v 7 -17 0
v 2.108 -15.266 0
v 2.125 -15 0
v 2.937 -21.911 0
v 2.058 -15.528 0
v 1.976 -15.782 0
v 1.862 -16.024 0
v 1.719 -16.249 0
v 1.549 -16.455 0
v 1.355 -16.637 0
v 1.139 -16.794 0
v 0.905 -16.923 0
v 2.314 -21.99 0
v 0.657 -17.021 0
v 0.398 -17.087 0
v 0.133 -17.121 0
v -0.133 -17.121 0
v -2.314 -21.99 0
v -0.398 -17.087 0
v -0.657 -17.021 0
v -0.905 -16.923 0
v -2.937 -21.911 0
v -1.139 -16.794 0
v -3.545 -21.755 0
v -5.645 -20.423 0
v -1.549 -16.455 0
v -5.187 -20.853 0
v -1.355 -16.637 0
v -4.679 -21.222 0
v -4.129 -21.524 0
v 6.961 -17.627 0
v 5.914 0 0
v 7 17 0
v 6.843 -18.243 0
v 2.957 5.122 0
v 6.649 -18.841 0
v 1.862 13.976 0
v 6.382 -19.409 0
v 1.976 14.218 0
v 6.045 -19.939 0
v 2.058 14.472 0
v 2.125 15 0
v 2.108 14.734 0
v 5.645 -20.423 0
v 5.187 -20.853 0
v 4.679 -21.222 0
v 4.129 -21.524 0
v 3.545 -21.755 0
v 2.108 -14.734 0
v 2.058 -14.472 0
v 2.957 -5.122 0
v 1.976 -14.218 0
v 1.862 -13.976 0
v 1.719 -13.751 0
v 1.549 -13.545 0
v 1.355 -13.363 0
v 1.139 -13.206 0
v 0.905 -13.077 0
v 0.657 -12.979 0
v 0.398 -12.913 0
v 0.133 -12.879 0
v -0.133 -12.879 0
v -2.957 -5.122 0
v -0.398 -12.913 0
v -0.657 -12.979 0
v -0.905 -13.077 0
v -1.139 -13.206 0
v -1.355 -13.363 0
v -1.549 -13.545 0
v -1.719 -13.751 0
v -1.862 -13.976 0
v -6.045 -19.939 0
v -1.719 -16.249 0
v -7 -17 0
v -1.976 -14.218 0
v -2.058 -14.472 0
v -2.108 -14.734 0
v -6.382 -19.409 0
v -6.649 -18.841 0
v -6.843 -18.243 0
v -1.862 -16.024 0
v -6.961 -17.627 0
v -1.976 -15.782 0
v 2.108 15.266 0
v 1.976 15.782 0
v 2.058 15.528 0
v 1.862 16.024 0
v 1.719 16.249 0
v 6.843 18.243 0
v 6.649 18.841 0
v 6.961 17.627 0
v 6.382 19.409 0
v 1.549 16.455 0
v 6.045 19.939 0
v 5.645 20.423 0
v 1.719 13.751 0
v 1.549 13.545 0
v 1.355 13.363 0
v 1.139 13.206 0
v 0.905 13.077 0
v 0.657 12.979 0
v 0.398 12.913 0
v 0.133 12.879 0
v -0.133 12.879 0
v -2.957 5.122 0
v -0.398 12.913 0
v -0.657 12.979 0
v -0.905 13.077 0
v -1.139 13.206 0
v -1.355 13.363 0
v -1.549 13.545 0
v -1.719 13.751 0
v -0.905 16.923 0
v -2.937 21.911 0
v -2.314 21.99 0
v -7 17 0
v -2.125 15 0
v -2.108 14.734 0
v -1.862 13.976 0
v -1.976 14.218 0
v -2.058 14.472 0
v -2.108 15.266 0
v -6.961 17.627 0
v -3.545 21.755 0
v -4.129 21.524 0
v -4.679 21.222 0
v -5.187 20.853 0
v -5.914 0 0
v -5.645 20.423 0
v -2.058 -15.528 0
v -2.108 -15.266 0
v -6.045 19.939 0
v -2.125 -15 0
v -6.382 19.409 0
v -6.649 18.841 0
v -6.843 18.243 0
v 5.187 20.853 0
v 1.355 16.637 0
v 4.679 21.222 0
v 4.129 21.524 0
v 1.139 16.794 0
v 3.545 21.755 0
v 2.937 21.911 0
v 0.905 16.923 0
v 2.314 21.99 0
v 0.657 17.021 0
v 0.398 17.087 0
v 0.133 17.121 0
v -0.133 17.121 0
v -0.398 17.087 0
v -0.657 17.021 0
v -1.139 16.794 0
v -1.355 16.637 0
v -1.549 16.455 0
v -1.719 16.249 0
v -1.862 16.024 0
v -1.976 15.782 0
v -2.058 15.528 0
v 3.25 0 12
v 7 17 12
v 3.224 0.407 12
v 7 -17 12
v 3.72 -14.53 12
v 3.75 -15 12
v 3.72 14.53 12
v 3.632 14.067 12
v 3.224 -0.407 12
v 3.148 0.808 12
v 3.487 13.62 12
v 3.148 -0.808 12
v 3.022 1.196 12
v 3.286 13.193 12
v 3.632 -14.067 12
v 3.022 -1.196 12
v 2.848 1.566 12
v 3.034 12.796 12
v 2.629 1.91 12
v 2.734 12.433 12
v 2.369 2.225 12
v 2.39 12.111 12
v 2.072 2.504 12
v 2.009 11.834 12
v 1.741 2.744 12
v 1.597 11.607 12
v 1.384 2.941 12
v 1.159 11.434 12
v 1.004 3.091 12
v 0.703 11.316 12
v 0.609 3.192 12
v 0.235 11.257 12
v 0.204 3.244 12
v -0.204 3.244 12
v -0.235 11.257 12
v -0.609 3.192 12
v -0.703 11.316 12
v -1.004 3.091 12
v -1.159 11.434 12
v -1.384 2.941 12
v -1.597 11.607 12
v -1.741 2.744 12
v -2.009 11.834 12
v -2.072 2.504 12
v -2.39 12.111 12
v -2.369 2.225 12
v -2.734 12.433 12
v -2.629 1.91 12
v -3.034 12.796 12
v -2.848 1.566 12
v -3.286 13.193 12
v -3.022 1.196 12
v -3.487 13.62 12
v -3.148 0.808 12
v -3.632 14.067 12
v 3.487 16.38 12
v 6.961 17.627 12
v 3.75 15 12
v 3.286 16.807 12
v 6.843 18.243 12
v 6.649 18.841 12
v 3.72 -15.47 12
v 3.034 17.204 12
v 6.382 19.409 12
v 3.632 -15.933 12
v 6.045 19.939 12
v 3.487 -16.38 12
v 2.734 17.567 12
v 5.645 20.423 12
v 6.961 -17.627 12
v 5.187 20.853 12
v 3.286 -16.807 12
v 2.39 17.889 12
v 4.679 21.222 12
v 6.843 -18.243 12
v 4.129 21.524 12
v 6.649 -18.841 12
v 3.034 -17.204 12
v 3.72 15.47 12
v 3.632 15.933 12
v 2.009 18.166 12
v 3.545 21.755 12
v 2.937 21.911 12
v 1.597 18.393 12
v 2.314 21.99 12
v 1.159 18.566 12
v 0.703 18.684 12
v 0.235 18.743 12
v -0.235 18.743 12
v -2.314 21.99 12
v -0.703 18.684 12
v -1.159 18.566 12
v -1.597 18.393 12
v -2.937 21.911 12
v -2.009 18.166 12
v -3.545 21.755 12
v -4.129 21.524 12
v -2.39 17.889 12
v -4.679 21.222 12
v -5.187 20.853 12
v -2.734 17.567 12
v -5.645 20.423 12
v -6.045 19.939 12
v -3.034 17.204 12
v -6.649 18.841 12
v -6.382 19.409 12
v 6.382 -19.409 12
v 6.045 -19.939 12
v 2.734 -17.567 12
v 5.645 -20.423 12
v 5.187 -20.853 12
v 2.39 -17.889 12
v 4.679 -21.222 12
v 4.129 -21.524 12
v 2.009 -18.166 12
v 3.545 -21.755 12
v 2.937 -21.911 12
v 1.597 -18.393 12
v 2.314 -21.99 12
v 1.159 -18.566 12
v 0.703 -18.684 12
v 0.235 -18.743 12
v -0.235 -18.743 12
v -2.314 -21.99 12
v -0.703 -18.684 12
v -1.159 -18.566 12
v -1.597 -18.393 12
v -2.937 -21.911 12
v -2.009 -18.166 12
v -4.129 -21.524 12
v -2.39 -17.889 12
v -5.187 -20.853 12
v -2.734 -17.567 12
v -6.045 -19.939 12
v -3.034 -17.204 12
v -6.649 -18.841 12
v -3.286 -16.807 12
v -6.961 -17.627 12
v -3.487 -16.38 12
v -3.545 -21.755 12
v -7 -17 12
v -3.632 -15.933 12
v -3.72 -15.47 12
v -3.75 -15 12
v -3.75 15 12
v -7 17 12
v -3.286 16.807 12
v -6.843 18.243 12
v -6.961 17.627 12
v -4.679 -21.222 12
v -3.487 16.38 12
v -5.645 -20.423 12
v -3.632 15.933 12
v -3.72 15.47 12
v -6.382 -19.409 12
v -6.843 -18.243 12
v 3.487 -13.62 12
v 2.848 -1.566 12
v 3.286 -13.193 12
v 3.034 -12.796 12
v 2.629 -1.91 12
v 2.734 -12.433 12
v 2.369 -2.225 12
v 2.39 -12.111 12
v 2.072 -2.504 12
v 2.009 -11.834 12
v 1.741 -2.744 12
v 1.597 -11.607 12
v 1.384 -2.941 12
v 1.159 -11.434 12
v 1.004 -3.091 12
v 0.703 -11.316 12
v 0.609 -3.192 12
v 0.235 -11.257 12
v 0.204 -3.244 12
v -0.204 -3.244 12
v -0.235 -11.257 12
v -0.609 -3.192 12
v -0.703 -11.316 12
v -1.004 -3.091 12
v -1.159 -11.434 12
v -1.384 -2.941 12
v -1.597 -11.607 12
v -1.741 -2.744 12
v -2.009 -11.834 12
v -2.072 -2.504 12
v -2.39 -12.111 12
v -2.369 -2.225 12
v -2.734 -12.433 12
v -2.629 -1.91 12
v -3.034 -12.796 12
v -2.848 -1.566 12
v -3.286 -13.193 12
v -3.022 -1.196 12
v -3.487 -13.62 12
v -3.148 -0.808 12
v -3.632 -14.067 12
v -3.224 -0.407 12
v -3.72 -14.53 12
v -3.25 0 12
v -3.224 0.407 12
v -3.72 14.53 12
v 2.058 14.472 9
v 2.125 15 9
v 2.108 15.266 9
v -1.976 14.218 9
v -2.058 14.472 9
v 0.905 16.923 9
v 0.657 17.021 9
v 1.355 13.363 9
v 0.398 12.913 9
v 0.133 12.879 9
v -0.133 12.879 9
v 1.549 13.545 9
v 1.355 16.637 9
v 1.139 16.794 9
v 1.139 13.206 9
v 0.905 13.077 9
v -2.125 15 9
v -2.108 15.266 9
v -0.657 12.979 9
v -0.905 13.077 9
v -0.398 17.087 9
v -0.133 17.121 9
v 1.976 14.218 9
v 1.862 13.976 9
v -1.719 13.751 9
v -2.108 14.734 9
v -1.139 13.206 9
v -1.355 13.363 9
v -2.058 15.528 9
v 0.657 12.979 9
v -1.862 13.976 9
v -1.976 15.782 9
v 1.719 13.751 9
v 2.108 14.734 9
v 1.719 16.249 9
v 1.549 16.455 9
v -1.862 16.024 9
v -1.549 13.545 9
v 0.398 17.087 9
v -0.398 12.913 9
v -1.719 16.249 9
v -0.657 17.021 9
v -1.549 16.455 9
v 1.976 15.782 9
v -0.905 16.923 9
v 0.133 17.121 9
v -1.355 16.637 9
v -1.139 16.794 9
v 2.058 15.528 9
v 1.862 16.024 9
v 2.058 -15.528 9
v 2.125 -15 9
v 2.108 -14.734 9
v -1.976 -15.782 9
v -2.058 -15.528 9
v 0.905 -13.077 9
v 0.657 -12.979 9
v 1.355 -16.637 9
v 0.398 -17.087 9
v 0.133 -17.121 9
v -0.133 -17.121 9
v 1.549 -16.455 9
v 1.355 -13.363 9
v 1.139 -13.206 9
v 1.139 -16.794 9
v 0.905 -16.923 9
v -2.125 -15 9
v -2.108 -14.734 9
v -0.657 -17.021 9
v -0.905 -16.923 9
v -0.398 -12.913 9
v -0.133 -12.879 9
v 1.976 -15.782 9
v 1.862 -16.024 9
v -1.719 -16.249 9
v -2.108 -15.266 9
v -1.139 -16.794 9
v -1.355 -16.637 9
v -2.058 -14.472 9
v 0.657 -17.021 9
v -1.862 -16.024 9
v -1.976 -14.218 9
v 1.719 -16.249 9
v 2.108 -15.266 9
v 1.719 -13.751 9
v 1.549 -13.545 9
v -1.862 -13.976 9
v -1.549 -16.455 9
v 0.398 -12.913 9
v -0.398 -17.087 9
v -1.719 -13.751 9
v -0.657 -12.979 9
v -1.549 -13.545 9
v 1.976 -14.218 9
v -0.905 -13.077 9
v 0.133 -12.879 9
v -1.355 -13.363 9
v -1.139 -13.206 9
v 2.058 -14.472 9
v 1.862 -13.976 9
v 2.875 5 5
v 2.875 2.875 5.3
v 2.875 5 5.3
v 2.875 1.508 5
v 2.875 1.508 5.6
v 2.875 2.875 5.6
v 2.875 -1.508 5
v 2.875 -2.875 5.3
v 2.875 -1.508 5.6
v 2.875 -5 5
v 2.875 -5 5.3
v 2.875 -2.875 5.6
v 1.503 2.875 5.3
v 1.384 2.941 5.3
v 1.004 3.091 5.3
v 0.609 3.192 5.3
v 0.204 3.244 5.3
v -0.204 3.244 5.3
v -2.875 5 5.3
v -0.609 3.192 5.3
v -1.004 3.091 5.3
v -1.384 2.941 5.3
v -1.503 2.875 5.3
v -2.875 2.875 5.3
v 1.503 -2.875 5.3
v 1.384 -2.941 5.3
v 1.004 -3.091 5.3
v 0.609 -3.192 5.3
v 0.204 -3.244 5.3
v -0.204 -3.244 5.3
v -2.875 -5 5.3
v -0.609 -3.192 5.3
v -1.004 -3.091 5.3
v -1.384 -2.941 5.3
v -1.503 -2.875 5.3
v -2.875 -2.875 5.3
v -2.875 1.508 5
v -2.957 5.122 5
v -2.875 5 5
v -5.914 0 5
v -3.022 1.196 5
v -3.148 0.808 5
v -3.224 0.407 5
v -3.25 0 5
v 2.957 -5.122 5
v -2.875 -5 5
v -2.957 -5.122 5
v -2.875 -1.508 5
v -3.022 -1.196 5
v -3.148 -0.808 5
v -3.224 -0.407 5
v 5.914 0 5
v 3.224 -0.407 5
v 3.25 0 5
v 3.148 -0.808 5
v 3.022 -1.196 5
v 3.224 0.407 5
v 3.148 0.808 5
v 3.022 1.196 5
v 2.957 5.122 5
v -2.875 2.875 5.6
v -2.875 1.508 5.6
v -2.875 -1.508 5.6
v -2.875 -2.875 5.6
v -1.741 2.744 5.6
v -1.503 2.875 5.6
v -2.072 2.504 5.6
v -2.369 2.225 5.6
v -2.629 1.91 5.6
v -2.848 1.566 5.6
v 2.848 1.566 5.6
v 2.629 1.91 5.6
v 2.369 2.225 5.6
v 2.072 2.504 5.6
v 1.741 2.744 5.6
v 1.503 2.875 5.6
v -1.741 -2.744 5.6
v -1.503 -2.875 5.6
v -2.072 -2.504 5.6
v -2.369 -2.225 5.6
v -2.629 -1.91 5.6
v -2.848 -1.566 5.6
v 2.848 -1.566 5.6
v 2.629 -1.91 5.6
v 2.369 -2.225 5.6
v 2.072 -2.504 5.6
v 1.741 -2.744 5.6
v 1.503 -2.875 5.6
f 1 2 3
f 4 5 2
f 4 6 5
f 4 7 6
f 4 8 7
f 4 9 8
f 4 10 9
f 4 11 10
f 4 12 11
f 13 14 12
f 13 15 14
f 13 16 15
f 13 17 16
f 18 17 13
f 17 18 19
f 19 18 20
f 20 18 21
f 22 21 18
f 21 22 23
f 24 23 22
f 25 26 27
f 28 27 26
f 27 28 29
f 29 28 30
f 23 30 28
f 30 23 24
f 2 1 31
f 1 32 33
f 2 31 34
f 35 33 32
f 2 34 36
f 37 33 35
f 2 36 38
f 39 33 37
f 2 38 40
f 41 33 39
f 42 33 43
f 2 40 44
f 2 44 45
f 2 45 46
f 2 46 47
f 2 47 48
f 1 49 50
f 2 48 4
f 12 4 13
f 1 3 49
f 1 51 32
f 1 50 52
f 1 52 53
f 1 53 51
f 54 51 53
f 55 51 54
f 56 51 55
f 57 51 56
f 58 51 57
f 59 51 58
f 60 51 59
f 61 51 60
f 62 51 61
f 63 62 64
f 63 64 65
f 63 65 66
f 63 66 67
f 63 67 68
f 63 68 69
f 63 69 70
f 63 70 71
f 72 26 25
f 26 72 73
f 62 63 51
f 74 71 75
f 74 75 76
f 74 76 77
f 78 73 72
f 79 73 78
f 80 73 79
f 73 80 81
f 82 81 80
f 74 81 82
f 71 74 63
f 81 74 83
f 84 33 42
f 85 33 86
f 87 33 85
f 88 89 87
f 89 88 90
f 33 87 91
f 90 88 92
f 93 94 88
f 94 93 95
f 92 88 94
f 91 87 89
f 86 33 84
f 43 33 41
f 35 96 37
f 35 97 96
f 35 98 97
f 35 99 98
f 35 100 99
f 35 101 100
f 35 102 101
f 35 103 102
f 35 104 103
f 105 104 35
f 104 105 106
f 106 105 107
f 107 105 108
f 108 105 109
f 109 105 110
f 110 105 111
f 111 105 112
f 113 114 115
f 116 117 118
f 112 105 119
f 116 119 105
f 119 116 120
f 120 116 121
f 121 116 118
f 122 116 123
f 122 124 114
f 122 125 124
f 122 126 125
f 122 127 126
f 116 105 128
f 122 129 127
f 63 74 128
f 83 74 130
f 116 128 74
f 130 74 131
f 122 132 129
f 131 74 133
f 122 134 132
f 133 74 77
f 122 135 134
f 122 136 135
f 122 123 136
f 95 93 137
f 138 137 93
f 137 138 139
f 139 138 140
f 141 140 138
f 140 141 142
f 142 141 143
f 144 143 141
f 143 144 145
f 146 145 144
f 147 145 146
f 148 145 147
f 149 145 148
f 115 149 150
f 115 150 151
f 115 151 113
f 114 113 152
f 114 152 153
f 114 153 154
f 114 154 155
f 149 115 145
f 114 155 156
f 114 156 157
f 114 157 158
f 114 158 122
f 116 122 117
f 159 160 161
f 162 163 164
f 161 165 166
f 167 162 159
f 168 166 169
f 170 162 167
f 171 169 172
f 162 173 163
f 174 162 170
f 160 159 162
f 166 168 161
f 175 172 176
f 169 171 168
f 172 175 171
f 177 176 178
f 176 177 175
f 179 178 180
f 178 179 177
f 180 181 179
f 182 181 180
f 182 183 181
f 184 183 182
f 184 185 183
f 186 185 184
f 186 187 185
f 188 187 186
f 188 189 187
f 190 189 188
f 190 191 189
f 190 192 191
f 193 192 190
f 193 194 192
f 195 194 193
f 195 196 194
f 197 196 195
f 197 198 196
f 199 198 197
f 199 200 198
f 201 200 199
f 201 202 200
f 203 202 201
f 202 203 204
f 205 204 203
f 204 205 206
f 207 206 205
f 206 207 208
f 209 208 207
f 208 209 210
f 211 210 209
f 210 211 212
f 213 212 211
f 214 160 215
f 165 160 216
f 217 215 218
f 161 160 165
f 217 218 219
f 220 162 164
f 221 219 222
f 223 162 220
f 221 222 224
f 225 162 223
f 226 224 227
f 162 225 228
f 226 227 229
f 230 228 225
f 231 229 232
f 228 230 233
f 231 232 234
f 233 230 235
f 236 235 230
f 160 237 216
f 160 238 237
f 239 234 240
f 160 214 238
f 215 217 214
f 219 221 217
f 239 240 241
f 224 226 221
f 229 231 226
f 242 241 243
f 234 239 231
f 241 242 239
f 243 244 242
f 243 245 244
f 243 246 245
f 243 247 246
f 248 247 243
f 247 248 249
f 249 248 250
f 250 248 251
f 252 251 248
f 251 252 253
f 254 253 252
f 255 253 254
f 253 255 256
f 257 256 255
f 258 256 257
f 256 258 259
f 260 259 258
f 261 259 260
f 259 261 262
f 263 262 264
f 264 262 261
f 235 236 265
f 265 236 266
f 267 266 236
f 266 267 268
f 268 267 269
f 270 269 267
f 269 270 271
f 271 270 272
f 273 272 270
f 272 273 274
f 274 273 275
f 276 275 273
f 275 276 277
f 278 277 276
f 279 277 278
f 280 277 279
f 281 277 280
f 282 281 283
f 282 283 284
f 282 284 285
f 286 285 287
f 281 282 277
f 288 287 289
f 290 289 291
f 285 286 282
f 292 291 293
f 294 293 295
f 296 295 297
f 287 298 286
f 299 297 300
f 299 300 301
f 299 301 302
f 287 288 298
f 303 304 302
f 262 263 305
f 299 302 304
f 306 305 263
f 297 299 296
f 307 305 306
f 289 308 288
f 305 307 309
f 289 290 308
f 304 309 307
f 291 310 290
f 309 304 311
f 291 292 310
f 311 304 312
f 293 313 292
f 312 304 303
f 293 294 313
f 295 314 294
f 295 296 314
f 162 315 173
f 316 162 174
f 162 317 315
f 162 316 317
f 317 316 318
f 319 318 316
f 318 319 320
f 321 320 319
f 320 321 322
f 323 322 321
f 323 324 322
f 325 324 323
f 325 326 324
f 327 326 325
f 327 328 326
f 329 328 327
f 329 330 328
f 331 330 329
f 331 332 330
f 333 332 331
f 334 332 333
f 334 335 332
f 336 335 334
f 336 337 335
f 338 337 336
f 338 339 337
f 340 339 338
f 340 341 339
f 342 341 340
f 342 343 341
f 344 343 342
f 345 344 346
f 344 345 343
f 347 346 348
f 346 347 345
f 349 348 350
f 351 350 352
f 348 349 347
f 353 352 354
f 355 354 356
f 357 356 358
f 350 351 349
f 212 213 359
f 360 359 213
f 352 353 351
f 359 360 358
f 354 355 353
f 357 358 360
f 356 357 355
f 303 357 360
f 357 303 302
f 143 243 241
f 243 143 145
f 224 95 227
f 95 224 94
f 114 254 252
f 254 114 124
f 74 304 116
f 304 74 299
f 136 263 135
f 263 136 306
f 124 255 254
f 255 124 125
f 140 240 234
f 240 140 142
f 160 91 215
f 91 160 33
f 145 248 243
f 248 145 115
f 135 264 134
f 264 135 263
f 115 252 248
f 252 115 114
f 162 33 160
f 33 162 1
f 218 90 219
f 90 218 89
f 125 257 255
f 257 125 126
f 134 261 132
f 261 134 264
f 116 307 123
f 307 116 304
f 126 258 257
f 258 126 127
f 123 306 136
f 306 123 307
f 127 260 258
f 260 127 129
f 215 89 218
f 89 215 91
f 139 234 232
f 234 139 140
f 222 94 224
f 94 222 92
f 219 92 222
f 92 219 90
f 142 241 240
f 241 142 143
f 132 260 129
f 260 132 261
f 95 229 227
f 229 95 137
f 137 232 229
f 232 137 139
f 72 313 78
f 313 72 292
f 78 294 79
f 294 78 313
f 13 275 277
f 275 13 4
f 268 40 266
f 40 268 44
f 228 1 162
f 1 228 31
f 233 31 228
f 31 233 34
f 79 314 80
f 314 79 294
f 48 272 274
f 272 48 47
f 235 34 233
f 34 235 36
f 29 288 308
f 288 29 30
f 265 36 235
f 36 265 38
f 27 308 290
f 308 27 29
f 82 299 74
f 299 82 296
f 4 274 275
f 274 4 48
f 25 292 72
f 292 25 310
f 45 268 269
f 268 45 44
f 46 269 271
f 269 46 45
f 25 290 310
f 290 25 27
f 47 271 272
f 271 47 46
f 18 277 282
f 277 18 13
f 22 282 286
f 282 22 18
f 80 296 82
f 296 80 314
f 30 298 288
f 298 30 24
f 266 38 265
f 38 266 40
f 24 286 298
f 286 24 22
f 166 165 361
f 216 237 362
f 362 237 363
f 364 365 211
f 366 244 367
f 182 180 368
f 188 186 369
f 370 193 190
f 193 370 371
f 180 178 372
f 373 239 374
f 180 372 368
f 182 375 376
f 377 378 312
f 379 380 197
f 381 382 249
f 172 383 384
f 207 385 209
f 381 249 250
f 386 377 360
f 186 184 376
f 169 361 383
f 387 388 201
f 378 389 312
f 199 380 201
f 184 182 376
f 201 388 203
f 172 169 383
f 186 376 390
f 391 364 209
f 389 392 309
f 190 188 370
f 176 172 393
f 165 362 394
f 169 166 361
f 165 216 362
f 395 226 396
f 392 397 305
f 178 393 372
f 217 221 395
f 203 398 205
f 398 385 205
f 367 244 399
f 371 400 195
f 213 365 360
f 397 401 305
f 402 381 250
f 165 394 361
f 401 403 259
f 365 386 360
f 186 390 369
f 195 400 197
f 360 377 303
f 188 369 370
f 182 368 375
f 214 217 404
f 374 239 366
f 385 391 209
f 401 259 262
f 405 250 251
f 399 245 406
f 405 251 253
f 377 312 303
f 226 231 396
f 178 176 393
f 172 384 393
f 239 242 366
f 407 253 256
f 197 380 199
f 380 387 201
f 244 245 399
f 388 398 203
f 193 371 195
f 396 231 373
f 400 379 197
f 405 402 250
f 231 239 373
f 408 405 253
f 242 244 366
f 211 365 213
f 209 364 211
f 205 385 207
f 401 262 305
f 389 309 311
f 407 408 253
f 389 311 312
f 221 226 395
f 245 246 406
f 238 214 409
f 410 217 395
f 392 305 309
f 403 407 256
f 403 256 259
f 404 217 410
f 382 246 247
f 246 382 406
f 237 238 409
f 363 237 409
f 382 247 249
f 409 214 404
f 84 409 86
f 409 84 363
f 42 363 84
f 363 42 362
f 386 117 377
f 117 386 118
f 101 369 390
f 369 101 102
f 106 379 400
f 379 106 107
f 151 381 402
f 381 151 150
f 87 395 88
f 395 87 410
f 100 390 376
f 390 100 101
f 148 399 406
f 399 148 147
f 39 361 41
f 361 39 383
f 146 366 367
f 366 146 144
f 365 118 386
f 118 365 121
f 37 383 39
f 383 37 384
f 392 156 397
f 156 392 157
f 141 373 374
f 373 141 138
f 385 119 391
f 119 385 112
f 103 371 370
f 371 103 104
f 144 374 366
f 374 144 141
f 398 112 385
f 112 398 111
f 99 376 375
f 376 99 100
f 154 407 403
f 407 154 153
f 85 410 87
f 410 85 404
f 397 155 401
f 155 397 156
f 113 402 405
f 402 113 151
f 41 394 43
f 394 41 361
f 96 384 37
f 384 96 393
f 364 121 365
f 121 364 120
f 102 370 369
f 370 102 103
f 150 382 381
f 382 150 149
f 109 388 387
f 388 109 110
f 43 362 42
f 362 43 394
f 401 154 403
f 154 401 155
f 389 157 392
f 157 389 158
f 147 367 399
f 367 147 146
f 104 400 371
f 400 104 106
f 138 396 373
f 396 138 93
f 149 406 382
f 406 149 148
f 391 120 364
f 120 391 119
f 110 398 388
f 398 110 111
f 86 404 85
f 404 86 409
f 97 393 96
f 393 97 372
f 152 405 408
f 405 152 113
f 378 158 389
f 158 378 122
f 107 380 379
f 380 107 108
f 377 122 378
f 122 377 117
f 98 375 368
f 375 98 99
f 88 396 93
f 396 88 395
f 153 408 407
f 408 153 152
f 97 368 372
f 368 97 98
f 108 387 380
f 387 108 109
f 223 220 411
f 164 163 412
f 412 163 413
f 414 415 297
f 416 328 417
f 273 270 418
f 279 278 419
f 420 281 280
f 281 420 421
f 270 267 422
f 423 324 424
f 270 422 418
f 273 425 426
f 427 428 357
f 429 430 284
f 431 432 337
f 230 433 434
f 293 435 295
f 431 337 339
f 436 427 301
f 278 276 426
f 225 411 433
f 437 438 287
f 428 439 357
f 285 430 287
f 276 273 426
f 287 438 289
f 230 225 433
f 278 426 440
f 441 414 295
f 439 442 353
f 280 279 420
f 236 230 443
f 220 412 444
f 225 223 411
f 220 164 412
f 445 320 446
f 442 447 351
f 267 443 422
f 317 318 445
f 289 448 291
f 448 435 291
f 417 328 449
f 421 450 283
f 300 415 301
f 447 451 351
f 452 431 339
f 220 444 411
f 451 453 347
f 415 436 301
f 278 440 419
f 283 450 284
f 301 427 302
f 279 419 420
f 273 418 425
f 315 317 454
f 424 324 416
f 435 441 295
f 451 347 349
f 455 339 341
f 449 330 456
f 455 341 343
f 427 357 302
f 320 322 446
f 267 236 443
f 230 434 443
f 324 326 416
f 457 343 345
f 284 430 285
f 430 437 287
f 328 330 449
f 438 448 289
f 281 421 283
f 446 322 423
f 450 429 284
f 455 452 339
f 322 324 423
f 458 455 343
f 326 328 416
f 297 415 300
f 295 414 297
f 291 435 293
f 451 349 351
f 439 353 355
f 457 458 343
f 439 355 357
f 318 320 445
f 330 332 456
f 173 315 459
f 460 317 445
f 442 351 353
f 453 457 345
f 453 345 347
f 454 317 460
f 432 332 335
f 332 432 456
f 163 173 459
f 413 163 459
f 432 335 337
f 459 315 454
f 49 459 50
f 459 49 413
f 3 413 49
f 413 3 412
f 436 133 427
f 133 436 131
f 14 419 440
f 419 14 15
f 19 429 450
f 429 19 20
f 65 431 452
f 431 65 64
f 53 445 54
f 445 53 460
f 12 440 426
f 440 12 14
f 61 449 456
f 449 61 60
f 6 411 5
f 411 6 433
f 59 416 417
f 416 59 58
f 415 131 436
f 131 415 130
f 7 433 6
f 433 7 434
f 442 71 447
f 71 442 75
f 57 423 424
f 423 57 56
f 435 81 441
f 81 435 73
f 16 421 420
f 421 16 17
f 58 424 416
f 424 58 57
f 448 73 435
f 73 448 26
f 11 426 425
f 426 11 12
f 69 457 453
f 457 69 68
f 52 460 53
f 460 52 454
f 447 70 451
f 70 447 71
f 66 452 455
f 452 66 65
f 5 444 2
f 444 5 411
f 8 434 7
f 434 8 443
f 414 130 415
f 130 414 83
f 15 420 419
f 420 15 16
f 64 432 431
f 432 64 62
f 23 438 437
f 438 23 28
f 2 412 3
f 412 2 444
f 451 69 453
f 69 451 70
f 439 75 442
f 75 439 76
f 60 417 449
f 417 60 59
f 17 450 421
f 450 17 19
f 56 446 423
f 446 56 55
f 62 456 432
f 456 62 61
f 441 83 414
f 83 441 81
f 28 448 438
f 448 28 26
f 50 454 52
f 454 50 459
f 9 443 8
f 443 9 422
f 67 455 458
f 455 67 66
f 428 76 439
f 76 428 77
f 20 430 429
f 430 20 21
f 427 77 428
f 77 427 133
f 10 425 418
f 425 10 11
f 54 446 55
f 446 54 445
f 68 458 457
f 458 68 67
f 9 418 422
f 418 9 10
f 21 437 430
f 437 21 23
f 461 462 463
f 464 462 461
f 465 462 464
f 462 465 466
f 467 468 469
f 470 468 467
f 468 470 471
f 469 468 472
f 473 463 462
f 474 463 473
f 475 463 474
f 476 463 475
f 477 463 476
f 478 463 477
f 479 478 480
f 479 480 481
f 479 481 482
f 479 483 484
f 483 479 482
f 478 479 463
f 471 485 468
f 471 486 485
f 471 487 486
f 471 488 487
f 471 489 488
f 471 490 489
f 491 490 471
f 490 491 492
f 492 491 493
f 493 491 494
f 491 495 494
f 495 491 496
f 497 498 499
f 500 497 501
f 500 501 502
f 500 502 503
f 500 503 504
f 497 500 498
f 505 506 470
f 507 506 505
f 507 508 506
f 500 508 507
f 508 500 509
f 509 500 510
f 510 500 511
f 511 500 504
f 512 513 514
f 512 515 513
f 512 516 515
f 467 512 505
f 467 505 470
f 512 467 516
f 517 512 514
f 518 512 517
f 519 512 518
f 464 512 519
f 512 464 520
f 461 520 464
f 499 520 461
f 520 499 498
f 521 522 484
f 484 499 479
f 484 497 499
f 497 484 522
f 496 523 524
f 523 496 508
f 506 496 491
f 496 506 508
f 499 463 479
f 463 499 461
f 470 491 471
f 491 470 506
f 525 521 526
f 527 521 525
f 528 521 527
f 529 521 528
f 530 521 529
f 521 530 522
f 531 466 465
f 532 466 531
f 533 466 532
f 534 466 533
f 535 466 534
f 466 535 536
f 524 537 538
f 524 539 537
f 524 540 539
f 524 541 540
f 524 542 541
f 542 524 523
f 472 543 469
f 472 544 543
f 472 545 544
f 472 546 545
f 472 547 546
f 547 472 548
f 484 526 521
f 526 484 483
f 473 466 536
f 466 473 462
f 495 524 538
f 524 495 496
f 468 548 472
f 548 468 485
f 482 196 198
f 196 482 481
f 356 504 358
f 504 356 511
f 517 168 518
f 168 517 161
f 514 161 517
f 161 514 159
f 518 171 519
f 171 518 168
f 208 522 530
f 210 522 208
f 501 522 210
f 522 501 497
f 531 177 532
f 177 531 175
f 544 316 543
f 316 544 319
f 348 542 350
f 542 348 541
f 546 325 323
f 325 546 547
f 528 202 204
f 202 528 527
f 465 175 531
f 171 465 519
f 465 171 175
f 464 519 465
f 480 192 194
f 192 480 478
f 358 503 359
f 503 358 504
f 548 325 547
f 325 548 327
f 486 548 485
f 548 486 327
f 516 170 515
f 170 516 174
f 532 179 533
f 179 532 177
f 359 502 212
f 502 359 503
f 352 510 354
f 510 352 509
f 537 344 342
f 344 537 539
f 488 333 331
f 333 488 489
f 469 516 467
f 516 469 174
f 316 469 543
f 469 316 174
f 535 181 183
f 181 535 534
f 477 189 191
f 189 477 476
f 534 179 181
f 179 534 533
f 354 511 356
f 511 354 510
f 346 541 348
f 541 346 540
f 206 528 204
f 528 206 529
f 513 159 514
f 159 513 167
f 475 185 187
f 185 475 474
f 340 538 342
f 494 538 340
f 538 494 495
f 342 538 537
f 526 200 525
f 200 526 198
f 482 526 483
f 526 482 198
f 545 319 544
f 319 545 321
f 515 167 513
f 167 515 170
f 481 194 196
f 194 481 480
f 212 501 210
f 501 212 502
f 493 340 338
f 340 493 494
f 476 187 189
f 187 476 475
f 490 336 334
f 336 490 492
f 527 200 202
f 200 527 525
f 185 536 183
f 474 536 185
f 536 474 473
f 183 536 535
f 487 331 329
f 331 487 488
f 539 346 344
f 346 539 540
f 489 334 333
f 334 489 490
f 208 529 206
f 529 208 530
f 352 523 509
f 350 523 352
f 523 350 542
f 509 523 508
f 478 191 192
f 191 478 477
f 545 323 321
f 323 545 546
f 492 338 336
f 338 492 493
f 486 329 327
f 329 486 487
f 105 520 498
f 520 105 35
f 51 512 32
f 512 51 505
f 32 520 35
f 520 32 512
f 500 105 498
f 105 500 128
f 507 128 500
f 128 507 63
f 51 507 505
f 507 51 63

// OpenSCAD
$fn = 50;


difference() {
	union() {
		cylinder(h = 12, r = 7.0000000000);
		translate(v = [0.0000000000, 7.5000000000, 0]) {
			hull() {
				translate(v = [-2.0000000000, 9.5000000000, 0]) {
					cylinder(h = 12, r = 5);
				}
				translate(v = [2.0000000000, 9.5000000000, 0]) {
					cylinder(h = 12, r = 5);
				}
				translate(v = [-2.0000000000, -9.5000000000, 0]) {
					cylinder(h = 12, r = 5);
				}
				translate(v = [2.0000000000, -9.5000000000, 0]) {
					cylinder(h = 12, r = 5);
				}
			}
		}
		translate(v = [0.0000000000, 7.5000000000, 0]) {
			hull() {
				translate(v = [-2.0000000000, 9.5000000000, 0]) {
					cylinder(h = 12, r = 5);
				}
				translate(v = [2.0000000000, 9.5000000000, 0]) {
					cylinder(h = 12, r = 5);
				}
				translate(v = [-2.0000000000, -9.5000000000, 0]) {
					cylinder(h = 12, r = 5);
				}
				translate(v = [2.0000000000, -9.5000000000, 0]) {
					cylinder(h = 12, r = 5);
				}
			}
		}
		translate(v = [0.0000000000, -7.5000000000, 0]) {
			hull() {
				translate(v = [-2.0000000000, 9.5000000000, 0]) {
					cylinder(h = 12, r = 5);
				}
				translate(v = [2.0000000000, 9.5000000000, 0]) {
					cylinder(h = 12, r = 5);
				}
				translate(v = [-2.0000000000, -9.5000000000, 0]) {
					cylinder(h = 12, r = 5);
				}
				translate(v = [2.0000000000, -9.5000000000, 0]) {
					cylinder(h = 12, r = 5);
				}
			}
		}
		translate(v = [0.0000000000, -7.5000000000, 0]) {
			hull() {
				translate(v = [-2.0000000000, 9.5000000000, 0]) {
					cylinder(h = 12, r = 5);
				}
				translate(v = [2.0000000000, 9.5000000000, 0]) {
					cylinder(h = 12, r = 5);
				}
				translate(v = [-2.0000000000, -9.5000000000, 0]) {
					cylinder(h = 12, r = 5);
				}
				translate(v = [2.0000000000, -9.5000000000, 0]) {
					cylinder(h = 12, r = 5);
				}
			}
		}
	}
	union() {
		translate(v = [0.0000000000, 15.0000000000, 12]) {
			rotate(a = [0, 0, 0]) {
				difference() {
					union() {
						#translate(v = [0, 0, -12.0000000000]) {
							cylinder(h = 12, r = 2.0000000000);
						}
						#translate(v = [0, 0, -3]) {
							cylinder(h = 3, r1 = 2.1250000000, r2 = 3.7500000000);
						}
						#translate(v = [0, 0, -12.0000000000]) {
							cylinder(h = 12, r = 2.1250000000);
						}
						#translate(v = [0, 0, -12.0000000000]) {
							cylinder(h = 12, r = 2.0000000000);
						}
					}
					union();
				}
			}
		}
		translate(v = [0.0000000000, 15.0000000000, 12]) {
			rotate(a = [0, 0, 0]) {
				difference() {
					union() {
						#translate(v = [0, 0, -12.0000000000]) {
							cylinder(h = 12, r = 2.0000000000);
						}
						#translate(v = [0, 0, -3]) {
							cylinder(h = 3, r1 = 2.1250000000, r2 = 3.7500000000);
						}
						#translate(v = [0, 0, -12.0000000000]) {
							cylinder(h = 12, r = 2.1250000000);
						}
						#translate(v = [0, 0, -12.0000000000]) {
							cylinder(h = 12, r = 2.0000000000);
						}
					}
					union();
				}
			}
		}
		translate(v = [0.0000000000, -15.0000000000, 12]) {
			rotate(a = [0, 0, 0]) {
				difference() {
					union() {
						#translate(v = [0, 0, -12.0000000000]) {
							cylinder(h = 12, r = 2.0000000000);
						}
						#translate(v = [0, 0, -3]) {
							cylinder(h = 3, r1 = 2.1250000000, r2 = 3.7500000000);
						}
						#translate(v = [0, 0, -12.0000000000]) {
							cylinder(h = 12, r = 2.1250000000);
						}
						#translate(v = [0, 0, -12.0000000000]) {
							cylinder(h = 12, r = 2.0000000000);
						}
					}
					union();
				}
			}
		}
		translate(v = [0.0000000000, -15.0000000000, 12]) {
			rotate(a = [0, 0, 0]) {
				difference() {
					union() {
						#translate(v = [0, 0, -12.0000000000]) {
							cylinder(h = 12, r = 2.0000000000);
						}
						#translate(v = [0, 0, -3]) {
							cylinder(h = 3, r1 = 2.1250000000, r2 = 3.7500000000);
						}
						#translate(v = [0, 0, -12.0000000000]) {
							cylinder(h = 12, r = 2.1250000000);
						}
						#translate(v = [0, 0, -12.0000000000]) {
							cylinder(h = 12, r = 2.0000000000);
						}
					}
					union();
				}
			}
		}
		translate(v = [0.0000000000, 0.0000000000, 0]) {
			rotate(a = [0, 0, 0]) {
				difference() {
					union() {
						#translate(v = [-2.8750000000, -5.0000000000, -0.3000000000]) {
							cube(size = [5.7500000000, 10, 0.3000000000]);
						}
						#translate(v = [-2.8750000000, -2.8750000000, -0.6000000000]) {
							cube(size = [5.7500000000, 5.7500000000, 0.3000000000]);
						}
						#translate(v = [-2.8750000000, -5.0000000000, 5]) {
							cube(size = [5.7500000000, 10, 0.3000000000]);
						}
						#translate(v = [-2.8750000000, -2.8750000000, 5.3000000000]) {
							cube(size = [5.7500000000, 5.7500000000, 0.3000000000]);
						}
						#translate(v = [0, 0, -100.0000000000]) {
							cylinder(h = 200, r = 3.2500000000);
						}
						#linear_extrude(height = 5) {
							polygon(points = [[5.9142500000, 0.0000000000], [2.9571250000, 5.1218907443], [-2.9571250000, 5.1218907443], [-5.9142500000, 0.0000000000], [-2.9571250000, -5.1218907443], [2.9571250000, -5.1218907443]]);
						}
						#translate(v = [-2.8750000000, -5.0000000000, -0.3000000000]) {
							cube(size = [5.7500000000, 10, 0.3000000000]);
						}
						#translate(v = [-2.8750000000, -2.8750000000, -0.6000000000]) {
							cube(size = [5.7500000000, 5.7500000000, 0.3000000000]);
						}
						#translate(v = [-2.8750000000, -5.0000000000, 5]) {
							cube(size = [5.7500000000, 10, 0.3000000000]);
						}
						#translate(v = [-2.8750000000, -2.8750000000, 5.3000000000]) {
							cube(size = [5.7500000000, 5.7500000000, 0.3000000000]);
						}
						#translate(v = [0, 0, -100.0000000000]) {
							cylinder(h = 200, r = 3.2500000000);
						}
						#translate(v = [-2.8750000000, -5.0000000000, -0.3000000000]) {
							cube(size = [5.7500000000, 10, 0.3000000000]);
						}
						#translate(v = [-2.8750000000, -2.8750000000, -0.6000000000]) {
							cube(size = [5.7500000000, 5.7500000000, 0.3000000000]);
						}
						#translate(v = [-2.8750000000, -5.0000000000, 5]) {
							cube(size = [5.7500000000, 10, 0.3000000000]);
						}
						#translate(v = [-2.8750000000, -2.8750000000, 5.3000000000]) {
							cube(size = [5.7500000000, 5.7500000000, 0.3000000000]);
						}
						#translate(v = [0, 0, -100.0000000000]) {
							cylinder(h = 200, r = 3.2500000000);
						}
					}
					union();
				}
			}
		}
		translate(v = [0, 0, -100]) {
			cylinder(h = 200, r = 3.2500000000);
		}
		translate(v = [0, 0, -100]) {
			cylinder(h = 200, r = 1.8000000000);
		}
	}
}
